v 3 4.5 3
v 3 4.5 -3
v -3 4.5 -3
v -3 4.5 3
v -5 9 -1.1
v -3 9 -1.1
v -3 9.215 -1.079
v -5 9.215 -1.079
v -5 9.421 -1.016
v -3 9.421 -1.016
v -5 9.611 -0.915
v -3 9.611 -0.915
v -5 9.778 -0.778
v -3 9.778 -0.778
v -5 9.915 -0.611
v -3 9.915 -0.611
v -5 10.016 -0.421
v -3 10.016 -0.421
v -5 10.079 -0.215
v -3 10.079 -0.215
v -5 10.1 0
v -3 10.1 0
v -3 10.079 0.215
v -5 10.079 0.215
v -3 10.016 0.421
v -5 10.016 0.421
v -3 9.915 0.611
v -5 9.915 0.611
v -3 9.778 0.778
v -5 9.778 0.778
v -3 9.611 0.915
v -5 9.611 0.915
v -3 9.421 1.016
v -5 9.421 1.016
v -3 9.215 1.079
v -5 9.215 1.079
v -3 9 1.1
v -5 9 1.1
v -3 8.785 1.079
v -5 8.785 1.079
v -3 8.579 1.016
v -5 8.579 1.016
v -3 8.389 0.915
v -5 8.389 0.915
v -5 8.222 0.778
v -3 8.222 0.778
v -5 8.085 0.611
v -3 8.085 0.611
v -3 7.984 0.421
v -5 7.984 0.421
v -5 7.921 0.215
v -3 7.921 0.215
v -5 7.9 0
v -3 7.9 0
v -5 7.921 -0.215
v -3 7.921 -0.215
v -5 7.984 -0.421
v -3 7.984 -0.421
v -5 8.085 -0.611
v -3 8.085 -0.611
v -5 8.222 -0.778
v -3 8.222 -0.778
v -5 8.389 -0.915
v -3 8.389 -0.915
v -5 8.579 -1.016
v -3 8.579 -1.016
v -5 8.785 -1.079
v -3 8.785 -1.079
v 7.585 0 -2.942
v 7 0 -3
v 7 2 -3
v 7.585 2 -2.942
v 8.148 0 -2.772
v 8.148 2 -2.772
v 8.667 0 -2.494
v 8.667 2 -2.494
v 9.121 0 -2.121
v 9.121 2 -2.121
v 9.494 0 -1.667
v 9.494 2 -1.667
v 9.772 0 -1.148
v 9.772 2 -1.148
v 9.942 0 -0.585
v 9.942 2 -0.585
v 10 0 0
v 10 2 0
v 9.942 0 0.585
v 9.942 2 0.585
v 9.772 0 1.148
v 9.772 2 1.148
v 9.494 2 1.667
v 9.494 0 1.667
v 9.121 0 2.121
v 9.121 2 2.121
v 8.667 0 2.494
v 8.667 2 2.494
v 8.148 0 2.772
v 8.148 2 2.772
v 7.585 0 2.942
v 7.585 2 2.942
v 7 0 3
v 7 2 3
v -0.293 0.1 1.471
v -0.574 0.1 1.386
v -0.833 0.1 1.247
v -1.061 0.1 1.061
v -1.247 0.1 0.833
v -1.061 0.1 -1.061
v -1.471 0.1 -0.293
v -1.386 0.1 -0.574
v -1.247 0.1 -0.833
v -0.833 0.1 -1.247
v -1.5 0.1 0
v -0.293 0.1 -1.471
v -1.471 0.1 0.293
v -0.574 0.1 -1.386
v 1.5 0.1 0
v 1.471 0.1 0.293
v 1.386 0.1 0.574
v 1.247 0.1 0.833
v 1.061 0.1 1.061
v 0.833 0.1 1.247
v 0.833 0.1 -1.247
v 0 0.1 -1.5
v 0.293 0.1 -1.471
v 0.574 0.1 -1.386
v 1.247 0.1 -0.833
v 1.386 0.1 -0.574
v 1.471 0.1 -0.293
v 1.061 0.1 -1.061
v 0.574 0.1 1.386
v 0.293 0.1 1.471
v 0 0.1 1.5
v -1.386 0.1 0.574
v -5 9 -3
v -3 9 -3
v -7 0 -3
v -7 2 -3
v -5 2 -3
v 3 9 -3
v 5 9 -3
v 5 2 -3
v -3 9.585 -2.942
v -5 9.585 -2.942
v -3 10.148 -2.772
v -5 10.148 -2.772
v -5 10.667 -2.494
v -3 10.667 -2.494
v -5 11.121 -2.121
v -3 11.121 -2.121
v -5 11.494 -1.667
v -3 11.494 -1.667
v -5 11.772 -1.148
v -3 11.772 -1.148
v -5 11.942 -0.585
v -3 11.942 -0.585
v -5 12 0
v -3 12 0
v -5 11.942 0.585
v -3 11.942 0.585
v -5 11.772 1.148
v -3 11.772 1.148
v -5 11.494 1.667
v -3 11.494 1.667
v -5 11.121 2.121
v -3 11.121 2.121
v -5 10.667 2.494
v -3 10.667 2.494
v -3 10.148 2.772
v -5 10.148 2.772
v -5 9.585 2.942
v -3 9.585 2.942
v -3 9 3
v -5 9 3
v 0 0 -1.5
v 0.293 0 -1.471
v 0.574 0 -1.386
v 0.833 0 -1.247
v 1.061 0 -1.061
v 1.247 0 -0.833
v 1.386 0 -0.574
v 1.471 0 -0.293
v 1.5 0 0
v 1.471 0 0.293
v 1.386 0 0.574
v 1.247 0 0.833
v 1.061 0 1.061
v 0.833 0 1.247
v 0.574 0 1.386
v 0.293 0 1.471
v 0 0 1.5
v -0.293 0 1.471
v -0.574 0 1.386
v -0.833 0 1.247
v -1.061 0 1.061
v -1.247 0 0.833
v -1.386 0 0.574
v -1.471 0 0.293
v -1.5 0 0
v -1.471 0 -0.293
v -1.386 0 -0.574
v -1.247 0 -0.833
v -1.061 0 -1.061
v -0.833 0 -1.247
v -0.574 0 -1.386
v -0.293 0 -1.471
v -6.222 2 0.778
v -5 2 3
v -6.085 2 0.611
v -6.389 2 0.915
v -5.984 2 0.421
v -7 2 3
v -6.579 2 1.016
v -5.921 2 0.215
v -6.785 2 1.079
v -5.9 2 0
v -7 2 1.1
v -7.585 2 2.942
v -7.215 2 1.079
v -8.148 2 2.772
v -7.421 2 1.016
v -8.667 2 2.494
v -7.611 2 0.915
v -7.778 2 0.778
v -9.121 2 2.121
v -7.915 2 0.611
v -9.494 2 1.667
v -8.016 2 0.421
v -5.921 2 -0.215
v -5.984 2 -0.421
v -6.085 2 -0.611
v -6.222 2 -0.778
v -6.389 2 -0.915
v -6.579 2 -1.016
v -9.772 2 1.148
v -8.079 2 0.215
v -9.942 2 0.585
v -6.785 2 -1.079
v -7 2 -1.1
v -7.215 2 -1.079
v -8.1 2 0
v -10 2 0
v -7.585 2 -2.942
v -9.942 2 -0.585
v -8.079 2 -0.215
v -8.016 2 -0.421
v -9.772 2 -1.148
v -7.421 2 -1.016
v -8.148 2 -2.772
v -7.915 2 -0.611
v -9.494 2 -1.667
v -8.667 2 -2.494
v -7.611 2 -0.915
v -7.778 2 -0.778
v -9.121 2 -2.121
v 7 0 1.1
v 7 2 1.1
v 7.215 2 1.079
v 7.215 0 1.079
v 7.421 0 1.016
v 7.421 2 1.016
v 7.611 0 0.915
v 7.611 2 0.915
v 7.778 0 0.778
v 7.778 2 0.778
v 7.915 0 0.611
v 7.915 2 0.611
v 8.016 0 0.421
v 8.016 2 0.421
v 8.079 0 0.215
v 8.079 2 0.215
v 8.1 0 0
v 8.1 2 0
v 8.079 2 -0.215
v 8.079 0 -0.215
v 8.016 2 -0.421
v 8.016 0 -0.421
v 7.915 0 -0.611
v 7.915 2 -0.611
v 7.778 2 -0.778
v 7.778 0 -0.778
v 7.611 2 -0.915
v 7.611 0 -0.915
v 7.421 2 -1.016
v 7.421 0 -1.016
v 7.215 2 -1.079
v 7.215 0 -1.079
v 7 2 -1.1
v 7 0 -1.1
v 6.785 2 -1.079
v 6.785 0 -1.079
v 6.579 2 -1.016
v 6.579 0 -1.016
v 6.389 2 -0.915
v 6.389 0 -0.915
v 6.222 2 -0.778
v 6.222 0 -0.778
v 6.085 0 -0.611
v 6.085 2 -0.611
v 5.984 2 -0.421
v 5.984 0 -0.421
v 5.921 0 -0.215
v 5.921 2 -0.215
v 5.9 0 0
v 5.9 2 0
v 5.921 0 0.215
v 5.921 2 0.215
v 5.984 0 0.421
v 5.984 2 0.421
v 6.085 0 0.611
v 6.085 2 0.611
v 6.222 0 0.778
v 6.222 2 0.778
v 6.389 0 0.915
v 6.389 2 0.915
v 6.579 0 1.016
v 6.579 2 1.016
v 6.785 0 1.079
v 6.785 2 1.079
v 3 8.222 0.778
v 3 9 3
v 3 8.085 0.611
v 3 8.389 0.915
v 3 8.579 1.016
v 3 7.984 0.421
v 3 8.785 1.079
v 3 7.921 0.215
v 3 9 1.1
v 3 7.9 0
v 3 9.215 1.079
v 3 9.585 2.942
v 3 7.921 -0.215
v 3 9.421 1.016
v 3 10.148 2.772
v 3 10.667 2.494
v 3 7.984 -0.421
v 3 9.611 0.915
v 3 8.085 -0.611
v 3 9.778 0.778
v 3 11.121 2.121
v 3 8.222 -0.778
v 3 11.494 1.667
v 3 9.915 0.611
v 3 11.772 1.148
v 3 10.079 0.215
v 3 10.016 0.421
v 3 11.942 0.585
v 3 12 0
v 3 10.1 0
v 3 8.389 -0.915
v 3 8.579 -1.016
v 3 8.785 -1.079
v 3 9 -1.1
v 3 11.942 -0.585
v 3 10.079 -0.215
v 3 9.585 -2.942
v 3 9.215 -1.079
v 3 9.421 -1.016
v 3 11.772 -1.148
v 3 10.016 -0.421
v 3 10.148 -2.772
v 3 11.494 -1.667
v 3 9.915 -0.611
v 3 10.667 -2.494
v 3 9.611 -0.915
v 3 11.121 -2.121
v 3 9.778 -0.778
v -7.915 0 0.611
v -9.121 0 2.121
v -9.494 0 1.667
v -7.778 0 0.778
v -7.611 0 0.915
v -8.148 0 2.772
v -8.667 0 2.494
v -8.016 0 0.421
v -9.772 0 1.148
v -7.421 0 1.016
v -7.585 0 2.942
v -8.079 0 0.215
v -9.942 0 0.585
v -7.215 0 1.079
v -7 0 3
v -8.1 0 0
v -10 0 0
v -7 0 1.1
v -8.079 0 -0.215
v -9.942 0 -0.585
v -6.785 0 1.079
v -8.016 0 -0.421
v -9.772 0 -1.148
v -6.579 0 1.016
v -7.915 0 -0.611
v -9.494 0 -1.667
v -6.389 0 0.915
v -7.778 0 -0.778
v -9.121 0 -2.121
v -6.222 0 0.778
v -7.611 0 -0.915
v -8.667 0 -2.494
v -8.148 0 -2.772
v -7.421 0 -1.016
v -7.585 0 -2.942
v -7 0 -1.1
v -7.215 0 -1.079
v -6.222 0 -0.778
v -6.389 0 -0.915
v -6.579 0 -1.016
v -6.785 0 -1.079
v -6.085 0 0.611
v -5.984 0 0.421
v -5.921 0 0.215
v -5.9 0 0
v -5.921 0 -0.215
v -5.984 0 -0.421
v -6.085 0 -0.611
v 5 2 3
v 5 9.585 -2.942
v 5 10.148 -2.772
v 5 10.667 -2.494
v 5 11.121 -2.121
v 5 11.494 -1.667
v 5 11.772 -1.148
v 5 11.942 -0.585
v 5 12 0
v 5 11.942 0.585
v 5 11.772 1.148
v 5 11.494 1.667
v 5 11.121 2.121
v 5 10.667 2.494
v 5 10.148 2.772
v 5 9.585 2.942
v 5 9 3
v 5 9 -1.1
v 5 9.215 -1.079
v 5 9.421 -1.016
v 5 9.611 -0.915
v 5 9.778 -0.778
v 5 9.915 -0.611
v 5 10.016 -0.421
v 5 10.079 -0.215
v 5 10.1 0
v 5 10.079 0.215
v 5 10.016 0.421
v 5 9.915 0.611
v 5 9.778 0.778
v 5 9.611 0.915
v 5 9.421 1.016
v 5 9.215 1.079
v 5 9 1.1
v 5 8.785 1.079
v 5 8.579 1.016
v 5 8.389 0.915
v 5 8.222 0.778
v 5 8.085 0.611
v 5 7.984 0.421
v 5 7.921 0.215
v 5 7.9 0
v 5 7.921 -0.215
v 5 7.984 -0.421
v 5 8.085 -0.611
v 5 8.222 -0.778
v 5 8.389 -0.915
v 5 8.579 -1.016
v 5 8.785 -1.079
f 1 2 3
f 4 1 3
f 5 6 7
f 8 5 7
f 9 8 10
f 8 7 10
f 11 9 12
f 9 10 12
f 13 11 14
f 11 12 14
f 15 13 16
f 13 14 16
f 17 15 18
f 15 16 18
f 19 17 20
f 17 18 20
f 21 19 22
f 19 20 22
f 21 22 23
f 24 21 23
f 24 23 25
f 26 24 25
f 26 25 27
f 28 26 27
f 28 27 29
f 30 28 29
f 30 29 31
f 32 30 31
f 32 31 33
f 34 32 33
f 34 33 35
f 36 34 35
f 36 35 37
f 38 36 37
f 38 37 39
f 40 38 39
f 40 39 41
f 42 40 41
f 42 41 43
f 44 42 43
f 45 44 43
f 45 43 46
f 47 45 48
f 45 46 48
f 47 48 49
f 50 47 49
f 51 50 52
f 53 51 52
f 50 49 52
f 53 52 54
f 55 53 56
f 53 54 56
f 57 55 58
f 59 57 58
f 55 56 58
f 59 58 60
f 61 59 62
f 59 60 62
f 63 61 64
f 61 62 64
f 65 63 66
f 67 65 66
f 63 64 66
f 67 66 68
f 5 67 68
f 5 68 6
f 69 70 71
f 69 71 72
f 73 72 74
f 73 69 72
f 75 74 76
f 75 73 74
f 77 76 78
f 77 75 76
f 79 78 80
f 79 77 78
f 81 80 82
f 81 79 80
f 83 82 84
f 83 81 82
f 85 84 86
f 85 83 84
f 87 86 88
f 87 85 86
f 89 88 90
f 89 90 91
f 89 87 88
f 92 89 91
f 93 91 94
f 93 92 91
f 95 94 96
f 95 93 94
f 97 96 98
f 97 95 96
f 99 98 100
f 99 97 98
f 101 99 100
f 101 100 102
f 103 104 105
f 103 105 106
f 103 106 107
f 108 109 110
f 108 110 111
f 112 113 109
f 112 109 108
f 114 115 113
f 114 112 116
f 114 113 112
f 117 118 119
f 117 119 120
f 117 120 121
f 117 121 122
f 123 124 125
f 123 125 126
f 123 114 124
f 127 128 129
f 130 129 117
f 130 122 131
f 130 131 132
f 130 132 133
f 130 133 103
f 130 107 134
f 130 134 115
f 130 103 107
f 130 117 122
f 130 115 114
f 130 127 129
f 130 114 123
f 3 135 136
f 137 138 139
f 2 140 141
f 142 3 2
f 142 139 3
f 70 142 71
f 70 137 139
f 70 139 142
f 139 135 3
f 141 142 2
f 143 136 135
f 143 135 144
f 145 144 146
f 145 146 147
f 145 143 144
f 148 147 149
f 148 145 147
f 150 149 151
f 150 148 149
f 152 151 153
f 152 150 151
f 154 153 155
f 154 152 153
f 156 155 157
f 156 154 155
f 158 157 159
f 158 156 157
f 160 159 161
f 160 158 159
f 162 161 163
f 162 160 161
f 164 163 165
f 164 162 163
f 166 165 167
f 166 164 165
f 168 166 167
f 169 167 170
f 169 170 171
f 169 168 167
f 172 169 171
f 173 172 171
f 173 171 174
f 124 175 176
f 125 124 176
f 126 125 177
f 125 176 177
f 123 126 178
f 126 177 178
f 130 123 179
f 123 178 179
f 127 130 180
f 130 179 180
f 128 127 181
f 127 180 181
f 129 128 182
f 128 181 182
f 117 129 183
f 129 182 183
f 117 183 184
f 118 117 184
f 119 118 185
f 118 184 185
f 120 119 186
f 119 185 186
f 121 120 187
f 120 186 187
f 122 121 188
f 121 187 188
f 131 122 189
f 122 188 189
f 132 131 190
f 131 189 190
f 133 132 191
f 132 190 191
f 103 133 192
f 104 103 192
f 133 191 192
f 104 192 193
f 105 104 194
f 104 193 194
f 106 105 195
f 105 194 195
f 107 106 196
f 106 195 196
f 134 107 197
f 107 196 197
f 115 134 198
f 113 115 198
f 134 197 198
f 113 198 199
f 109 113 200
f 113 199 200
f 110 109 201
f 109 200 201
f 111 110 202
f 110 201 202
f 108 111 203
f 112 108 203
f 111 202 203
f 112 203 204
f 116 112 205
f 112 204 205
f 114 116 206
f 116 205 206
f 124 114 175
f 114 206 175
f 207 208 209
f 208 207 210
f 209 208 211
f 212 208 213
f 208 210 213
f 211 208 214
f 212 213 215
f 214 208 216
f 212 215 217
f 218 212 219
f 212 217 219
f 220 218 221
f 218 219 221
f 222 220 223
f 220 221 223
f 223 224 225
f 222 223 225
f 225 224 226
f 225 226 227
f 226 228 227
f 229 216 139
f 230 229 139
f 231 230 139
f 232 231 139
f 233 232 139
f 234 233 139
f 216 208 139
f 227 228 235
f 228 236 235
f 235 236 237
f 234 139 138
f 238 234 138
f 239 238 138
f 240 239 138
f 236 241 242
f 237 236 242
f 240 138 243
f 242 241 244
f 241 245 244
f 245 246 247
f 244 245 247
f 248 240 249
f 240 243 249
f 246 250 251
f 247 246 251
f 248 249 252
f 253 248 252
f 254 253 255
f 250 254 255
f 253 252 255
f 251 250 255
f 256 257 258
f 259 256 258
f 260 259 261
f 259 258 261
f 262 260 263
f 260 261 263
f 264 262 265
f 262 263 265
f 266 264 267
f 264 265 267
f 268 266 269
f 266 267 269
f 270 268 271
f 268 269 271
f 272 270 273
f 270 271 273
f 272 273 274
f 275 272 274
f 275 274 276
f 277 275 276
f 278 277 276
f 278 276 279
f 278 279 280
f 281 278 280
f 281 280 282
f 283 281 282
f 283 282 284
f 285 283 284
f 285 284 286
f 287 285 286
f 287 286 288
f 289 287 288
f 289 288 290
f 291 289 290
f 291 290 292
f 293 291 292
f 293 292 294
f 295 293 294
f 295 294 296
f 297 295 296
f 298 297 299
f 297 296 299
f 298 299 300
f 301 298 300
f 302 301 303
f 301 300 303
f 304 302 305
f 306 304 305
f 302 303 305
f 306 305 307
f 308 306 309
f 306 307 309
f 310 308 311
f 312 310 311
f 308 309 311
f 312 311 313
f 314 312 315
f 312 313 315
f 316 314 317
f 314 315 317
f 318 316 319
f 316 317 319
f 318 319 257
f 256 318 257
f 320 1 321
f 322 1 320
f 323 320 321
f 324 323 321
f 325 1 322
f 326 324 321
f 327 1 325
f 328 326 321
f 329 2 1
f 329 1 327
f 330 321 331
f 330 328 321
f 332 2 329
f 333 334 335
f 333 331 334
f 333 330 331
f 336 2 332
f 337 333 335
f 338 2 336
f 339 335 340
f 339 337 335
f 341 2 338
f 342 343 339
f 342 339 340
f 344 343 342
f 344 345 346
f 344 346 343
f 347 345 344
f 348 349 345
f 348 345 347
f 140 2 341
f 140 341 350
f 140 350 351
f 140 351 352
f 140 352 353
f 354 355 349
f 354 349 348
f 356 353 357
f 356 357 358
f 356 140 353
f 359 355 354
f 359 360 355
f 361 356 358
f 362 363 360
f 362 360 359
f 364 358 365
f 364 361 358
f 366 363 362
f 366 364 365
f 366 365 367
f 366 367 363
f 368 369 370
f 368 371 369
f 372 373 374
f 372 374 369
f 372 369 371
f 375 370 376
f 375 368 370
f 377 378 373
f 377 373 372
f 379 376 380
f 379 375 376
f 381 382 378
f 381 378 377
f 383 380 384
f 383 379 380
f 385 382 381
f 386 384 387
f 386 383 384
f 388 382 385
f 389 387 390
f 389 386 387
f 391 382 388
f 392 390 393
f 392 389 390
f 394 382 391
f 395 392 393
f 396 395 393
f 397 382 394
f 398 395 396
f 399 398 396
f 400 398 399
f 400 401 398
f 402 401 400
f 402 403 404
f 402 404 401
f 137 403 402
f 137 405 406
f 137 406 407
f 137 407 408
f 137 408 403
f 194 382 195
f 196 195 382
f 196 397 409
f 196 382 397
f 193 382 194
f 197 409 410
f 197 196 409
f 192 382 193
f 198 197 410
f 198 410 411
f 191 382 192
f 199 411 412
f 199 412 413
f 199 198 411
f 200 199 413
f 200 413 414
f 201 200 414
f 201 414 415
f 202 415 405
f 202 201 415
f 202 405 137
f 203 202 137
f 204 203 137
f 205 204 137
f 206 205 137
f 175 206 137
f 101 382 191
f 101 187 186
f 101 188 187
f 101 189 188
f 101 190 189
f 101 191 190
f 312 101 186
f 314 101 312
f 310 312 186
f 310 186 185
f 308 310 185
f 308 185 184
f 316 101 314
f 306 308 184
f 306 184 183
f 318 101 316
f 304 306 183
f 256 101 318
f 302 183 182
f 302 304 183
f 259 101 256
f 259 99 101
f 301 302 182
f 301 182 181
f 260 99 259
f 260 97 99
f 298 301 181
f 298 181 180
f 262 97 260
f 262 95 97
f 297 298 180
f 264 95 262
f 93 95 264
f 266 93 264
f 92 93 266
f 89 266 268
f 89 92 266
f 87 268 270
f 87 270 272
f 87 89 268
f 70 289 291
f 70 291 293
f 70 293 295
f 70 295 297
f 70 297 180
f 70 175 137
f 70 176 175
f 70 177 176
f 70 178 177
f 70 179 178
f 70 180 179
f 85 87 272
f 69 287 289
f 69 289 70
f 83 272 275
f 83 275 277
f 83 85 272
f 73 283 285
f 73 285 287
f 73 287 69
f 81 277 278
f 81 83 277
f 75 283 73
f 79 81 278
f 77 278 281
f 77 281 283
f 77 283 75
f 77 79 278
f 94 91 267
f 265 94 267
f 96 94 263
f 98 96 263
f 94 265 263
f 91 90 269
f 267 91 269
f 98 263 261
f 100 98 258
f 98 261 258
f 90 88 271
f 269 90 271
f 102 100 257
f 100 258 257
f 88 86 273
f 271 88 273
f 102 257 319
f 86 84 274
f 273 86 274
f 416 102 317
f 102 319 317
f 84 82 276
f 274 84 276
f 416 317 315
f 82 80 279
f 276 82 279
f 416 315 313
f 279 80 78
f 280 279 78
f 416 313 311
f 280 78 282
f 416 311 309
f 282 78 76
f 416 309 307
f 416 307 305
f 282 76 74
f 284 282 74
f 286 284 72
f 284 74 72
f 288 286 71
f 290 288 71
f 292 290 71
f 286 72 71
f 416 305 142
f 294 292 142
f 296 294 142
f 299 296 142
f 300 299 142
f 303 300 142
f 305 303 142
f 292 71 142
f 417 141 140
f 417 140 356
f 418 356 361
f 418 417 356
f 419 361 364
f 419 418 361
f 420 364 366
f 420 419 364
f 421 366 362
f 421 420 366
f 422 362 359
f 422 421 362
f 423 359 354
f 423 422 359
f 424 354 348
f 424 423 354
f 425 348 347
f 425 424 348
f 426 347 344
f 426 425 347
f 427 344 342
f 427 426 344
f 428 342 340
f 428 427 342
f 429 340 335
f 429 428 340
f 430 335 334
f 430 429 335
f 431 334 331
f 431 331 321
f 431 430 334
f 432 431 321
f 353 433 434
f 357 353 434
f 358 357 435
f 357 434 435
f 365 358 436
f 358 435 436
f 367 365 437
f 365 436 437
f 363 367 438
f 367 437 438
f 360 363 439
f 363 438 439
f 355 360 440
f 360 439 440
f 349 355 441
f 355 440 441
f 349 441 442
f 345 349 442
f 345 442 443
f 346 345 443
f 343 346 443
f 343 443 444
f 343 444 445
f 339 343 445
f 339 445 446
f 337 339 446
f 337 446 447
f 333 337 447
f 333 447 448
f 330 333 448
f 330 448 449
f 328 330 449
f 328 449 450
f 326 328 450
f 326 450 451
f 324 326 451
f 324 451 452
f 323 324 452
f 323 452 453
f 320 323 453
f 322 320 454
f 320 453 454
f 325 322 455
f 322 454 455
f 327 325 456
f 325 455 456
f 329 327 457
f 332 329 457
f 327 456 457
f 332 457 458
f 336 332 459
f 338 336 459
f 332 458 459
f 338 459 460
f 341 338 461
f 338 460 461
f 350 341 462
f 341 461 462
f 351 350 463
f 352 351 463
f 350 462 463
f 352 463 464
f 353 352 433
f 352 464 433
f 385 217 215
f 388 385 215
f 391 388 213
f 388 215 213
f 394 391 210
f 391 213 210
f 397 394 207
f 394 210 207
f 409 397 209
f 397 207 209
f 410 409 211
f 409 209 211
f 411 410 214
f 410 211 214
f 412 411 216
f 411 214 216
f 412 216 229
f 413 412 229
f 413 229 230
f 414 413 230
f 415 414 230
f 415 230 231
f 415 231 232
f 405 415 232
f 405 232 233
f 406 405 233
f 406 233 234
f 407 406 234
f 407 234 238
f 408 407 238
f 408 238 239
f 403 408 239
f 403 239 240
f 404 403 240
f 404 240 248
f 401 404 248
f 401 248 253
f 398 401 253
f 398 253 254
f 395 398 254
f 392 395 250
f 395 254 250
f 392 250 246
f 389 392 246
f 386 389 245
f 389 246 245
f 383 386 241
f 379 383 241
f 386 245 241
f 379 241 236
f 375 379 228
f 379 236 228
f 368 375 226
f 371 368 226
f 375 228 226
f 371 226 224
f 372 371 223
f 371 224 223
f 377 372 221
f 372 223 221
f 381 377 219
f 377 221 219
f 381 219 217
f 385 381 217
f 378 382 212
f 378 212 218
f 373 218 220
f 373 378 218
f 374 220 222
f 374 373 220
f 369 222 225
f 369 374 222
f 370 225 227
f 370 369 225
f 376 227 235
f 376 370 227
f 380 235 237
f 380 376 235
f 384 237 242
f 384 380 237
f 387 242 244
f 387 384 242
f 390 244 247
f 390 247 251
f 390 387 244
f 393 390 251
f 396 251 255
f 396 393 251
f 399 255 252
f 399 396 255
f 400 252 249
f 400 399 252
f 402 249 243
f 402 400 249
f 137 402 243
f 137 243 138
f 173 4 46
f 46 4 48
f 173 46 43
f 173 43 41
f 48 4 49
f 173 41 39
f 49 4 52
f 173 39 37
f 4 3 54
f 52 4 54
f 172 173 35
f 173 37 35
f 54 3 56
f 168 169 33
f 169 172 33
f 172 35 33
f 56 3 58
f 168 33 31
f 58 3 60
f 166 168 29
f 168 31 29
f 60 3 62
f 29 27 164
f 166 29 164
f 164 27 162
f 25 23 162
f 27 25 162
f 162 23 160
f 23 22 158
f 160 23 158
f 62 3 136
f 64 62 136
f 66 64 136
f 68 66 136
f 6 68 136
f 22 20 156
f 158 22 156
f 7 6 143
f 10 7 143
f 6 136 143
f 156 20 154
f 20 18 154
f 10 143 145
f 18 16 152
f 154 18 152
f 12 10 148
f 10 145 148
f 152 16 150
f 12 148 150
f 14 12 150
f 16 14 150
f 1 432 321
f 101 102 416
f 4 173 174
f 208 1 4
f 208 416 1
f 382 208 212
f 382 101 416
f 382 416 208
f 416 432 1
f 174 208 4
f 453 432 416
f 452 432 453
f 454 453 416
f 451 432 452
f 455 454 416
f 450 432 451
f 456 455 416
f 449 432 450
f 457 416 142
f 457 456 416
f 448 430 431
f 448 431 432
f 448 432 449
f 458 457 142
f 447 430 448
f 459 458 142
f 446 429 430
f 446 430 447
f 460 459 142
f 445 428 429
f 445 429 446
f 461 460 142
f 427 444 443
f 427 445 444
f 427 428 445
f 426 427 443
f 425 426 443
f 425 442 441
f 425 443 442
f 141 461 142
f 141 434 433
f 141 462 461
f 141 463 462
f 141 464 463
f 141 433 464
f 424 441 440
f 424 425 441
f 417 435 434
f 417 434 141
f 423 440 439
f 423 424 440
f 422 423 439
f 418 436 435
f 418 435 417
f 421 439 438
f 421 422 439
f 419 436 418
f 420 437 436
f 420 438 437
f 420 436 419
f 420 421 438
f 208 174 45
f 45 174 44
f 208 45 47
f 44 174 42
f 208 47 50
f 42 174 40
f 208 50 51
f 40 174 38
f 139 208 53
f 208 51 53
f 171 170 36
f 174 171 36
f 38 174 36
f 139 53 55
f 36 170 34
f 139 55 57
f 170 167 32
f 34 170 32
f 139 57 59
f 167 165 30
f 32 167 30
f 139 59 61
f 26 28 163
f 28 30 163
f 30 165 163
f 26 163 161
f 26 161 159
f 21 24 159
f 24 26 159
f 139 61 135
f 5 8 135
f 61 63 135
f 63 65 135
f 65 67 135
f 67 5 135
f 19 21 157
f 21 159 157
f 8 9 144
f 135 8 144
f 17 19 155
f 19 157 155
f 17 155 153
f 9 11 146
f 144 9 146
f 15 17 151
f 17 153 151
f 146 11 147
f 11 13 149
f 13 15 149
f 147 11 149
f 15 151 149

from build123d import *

# Parameters (mm, degrees)
EXTRUDE_1_DEPTH     = 2
SKETCH_2_W          = 6
SKETCH_2_H          = 12
EXTRUDE_2_DEPTH     = 5
FILLET_1_RADIUS     = 3
FILLET_1_LENGTH     = 10
SKETCH_4_R          = 1.1
CUT_EXTRUDE_2_DEPTH = 28
SKETCH_7_R          = 1.1
CUT_EXTRUDE_5_DEPTH = 3.5
SKETCH_9_R          = 1.5
CUT_EXTRUDE_7_DEPTH = 0.1
SKETCH_15_W         = 6
SKETCH_15_H         = 9.205828816
CUT_EXTRUDE_8_DEPTH = 10


with BuildPart() as part:
    # 草图1 → 凸台-拉伸1 (new body)
    with BuildSketch(Plane(origin=(0, 0, 0), x_dir=(1, 0, 0), z_dir=(0, 1, 0))):
        with BuildLine():
            Line((-7, 3), (7, 3))
            ThreePointArc((7, 3), (10, 0), (7, -3))
            Line((7, -3), (-7, -3))
            ThreePointArc((-7, -3), (-10, 0), (-7, 3))
        make_face()
    extrude(amount=EXTRUDE_1_DEPTH)

    # 草图2 → 凸台-拉伸2 (add, symmetric)
    with BuildSketch(Plane(origin=(0, 0, 0), x_dir=(0, 0, -1), z_dir=(1, 0, 0))):
        with Locations((0, 6)):
            Rectangle(SKETCH_2_W, SKETCH_2_H)
    extrude(amount=EXTRUDE_2_DEPTH, both=True)

    # 圆角1: full round fillet: the end face becomes a half cylinder, R = half its width
    fillet_1_face = Plane((0, 12, 0), x_dir=(1, 0, 0), z_dir=(0, 1, 0))  # on the end face: x along it, z out of the body
    fillet_1_slab = fillet_1_face.offset(-FILLET_1_RADIUS / 2) * Box(FILLET_1_LENGTH, 2 * FILLET_1_RADIUS, FILLET_1_RADIUS, mode=Mode.PRIVATE)  # the body's end, R deep
    fillet_1_round = Plane((0, 9, 0), x_dir=(0, 1, 0), z_dir=(1, 0, 0)) * Cylinder(FILLET_1_RADIUS, FILLET_1_LENGTH, mode=Mode.PRIVATE)  # its axis R under the face
    add(fillet_1_slab - fillet_1_round, mode=Mode.SUBTRACT)

    # 草图4 → 切除-拉伸2 (cut)
    with BuildSketch(Plane(origin=(5, 0, 0), x_dir=(0, 0, -1), z_dir=(1, 0, 0))):
        with Locations((0, 9)):
            Circle(SKETCH_4_R)
    extrude(amount=-CUT_EXTRUDE_2_DEPTH, mode=Mode.SUBTRACT)

    # 草图7 → 切除-拉伸5 (cut)
    with BuildSketch(Plane(origin=(0, 2, 0), x_dir=(1, 0, 0), z_dir=(0, 1, 0))):
        with Locations(Location((7, 0, 0), (0, 0, 270))):
            Circle(SKETCH_7_R)
        with Locations(Location((-7, 0, 0), (0, 0, 270))):
            Circle(SKETCH_7_R)
    extrude(amount=-CUT_EXTRUDE_5_DEPTH, mode=Mode.SUBTRACT)

    # 草图9 → 切除-拉伸7 (cut)
    with BuildSketch(Plane.XZ):
        with Locations(Location((0, 0, 0), (0, 0, 270))):
            Circle(SKETCH_9_R)
    extrude(amount=-CUT_EXTRUDE_7_DEPTH, mode=Mode.SUBTRACT)

    # 草图15 → 切除-拉伸8 (cut)
    with BuildSketch(Plane(origin=(0, 0, -3), x_dir=(-1, 0, 0), z_dir=(0, 0, -1))):
        with Locations((0, 9.102914408)):
            Rectangle(SKETCH_15_W, SKETCH_15_H)
    extrude(amount=-CUT_EXTRUDE_8_DEPTH, mode=Mode.SUBTRACT)


solid = part.part
